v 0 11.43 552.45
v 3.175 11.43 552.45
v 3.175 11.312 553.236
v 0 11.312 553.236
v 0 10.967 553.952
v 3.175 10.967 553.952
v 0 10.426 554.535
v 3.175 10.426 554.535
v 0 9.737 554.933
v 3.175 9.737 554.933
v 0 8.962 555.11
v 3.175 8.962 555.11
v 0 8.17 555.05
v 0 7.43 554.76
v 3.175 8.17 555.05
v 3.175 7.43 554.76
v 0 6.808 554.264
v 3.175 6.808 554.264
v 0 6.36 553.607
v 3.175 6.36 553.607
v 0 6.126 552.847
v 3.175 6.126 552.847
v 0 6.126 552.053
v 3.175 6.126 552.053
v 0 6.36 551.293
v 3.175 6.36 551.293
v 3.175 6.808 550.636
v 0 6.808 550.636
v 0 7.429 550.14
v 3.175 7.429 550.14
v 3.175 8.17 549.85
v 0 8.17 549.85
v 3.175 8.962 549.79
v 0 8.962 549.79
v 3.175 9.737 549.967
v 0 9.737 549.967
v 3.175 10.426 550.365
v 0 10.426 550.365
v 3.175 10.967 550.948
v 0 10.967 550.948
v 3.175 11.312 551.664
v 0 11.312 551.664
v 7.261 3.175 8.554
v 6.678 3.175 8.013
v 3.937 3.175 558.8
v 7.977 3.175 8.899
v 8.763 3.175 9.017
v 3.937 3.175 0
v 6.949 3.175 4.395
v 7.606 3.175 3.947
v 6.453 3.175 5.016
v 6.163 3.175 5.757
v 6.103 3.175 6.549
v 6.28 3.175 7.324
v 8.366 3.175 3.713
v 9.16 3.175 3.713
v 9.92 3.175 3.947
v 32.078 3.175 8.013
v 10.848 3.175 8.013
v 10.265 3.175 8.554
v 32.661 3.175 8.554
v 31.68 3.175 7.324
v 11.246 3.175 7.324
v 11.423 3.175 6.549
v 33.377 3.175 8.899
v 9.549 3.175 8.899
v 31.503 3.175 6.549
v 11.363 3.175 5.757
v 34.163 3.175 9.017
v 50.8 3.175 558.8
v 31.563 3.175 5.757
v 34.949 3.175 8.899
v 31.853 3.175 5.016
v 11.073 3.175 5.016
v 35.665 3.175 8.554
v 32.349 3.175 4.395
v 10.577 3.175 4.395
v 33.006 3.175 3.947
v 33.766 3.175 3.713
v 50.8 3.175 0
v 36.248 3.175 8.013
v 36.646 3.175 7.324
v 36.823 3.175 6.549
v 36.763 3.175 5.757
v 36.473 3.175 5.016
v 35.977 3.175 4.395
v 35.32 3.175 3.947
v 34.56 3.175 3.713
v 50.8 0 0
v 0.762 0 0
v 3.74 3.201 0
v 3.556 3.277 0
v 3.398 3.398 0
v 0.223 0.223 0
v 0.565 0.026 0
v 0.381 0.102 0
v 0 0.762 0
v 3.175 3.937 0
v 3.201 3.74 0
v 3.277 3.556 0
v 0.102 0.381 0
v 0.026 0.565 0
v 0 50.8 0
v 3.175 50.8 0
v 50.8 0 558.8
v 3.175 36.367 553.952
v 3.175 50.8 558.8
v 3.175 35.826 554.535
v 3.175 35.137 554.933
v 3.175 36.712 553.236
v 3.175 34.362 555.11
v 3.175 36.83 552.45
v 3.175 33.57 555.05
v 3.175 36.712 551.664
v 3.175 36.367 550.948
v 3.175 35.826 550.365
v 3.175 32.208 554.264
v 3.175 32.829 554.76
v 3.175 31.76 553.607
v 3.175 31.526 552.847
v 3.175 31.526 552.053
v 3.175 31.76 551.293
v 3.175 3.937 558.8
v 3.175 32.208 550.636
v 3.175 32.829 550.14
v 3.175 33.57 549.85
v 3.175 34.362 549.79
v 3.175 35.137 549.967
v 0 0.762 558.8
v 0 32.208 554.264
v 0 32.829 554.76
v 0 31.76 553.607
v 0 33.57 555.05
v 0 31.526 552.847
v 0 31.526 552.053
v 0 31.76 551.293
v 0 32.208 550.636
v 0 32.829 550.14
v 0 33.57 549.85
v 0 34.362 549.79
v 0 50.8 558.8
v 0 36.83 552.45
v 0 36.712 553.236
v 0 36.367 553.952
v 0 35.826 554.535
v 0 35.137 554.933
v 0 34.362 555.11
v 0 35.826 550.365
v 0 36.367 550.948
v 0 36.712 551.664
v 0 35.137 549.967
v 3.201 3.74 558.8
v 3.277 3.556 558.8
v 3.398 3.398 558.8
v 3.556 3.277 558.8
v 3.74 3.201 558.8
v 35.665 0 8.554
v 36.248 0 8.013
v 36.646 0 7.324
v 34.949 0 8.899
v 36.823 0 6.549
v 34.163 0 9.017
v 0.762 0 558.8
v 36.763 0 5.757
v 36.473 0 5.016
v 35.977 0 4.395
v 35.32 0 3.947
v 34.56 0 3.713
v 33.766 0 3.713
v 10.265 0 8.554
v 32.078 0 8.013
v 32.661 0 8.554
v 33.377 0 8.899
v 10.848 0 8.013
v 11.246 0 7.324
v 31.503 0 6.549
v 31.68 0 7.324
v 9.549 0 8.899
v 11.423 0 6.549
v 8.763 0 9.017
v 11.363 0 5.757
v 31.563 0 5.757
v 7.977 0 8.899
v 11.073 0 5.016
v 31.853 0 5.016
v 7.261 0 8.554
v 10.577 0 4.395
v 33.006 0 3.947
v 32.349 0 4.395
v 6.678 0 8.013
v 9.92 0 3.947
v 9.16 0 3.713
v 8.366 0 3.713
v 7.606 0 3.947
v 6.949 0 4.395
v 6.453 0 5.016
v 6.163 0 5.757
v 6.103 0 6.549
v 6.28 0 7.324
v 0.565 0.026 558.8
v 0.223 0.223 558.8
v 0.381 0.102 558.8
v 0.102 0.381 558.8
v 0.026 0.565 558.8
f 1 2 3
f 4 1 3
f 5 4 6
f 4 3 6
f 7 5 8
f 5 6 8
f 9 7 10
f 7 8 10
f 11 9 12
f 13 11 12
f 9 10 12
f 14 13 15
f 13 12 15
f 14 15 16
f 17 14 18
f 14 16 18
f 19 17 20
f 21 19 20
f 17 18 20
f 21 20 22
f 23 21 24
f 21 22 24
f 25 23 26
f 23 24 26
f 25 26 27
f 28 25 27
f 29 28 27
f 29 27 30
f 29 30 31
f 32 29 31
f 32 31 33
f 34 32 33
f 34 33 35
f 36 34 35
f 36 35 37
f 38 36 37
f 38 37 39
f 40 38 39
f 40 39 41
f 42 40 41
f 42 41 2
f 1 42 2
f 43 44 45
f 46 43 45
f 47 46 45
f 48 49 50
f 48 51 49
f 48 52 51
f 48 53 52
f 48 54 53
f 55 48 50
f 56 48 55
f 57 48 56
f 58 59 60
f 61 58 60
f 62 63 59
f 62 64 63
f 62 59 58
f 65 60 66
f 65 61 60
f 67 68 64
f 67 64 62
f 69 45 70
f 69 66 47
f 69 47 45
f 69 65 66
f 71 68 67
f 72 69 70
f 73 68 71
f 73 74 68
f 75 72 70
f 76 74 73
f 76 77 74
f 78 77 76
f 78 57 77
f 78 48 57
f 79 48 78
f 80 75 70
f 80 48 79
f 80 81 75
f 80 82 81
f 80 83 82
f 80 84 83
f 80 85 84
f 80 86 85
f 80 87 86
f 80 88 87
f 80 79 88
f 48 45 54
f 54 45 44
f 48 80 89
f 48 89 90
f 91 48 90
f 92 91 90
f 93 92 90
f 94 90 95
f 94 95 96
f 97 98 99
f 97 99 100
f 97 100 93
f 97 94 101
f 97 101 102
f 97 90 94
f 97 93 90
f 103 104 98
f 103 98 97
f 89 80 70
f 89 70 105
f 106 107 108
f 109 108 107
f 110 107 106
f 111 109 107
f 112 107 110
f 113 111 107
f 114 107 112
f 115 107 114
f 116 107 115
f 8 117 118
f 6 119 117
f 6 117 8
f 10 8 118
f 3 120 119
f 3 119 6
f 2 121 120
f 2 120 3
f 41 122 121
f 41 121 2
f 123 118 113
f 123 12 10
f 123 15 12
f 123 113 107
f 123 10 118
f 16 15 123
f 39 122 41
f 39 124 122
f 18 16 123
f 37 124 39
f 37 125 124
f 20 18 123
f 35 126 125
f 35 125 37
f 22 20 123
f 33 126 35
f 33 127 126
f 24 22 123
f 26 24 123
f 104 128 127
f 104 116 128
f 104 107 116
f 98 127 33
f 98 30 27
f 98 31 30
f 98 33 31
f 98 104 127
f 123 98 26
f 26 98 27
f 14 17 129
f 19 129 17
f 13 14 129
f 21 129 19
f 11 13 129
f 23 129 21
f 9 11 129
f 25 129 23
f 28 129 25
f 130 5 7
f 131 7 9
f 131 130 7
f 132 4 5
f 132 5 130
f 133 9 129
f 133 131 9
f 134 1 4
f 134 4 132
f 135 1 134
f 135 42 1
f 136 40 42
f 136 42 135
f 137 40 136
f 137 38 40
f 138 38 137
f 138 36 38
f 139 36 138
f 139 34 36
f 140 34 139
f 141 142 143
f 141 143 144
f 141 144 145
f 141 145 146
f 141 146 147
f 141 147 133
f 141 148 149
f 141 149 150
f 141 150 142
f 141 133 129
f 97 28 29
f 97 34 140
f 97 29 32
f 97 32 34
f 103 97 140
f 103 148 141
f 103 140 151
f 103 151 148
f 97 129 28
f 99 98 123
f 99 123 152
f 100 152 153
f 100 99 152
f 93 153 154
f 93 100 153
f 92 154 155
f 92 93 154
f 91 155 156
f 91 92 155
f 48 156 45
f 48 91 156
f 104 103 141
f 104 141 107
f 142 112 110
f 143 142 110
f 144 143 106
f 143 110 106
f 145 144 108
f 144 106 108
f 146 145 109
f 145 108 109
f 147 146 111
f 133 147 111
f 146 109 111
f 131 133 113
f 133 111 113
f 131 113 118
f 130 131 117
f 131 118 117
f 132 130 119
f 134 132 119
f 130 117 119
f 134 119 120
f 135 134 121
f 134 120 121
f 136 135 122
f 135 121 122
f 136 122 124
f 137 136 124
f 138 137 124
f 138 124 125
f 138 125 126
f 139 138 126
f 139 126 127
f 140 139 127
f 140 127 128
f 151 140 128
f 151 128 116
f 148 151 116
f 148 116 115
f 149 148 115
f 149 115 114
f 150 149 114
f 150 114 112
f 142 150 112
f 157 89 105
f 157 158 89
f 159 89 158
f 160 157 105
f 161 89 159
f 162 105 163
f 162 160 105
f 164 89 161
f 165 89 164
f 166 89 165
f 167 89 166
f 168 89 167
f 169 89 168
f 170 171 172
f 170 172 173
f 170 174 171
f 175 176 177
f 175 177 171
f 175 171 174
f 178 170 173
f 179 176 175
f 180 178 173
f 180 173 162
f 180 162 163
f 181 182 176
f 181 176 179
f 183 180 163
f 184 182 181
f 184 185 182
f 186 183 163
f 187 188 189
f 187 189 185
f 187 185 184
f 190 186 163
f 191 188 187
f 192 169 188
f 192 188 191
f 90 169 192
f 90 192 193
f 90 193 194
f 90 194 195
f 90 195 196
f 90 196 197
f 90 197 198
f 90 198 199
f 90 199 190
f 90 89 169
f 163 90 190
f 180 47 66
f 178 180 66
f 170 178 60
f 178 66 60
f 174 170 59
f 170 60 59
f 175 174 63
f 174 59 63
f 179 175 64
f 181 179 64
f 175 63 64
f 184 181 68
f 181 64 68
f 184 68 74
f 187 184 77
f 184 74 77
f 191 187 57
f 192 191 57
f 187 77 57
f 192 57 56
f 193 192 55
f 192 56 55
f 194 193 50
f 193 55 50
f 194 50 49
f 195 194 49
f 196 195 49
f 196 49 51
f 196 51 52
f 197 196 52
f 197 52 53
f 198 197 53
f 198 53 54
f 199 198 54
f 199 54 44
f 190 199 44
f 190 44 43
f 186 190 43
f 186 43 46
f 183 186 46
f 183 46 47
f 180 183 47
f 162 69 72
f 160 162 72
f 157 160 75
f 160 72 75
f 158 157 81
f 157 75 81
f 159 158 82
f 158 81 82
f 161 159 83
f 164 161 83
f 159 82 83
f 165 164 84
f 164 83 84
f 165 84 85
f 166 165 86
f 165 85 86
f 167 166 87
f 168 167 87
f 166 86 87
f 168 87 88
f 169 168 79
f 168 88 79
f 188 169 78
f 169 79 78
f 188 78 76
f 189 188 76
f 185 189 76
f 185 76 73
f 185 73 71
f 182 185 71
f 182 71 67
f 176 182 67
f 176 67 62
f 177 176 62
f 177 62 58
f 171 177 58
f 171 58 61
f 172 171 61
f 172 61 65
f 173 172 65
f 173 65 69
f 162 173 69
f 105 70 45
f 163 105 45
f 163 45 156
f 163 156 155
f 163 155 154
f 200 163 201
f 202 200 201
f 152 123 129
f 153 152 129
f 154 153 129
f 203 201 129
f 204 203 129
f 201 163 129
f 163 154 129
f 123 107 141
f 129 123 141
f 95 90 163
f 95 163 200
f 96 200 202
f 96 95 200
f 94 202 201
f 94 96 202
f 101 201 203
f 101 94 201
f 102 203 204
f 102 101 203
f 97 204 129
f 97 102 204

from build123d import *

# Parameters (mm, degrees)
BOSS_EXTRUDE1_DEPTH = 558.8
SKETCH2_R           = 2.667
CUT_EXTRUDE1_DEPTH  = 564.121852377
SKETCH3_R           = 2.667
CUT_EXTRUDE2_DEPTH  = 564.121852377


with BuildPart() as part:
    # Sketch1 → Boss-Extrude1 (new body)
    with BuildSketch(Plane.XY):
        with BuildLine():
            Line((3.175, 50.8), (3.175, 3.937))
            ThreePointArc((3.175, 3.937), (3.398184633, 3.398184633), (3.937, 3.175))
            Line((3.937, 3.175), (50.8, 3.175))
            Line((50.8, 3.175), (50.8, 0))
            Line((50.8, 0), (0.762, 0))
            ThreePointArc((0.762, 0), (0.223184633, 0.223184633), (0, 0.762))
            Line((0, 0.762), (0, 50.8))
            Line((0, 50.8), (3.175, 50.8))
        make_face()
    extrude(amount=BOSS_EXTRUDE1_DEPTH)

    # Sketch2 → Cut-Extrude1 (cut, through all)
    with BuildSketch(Plane(origin=(0, 3.175, 0), x_dir=(1, 0, 0), z_dir=(0, 1, 0))):
        with Locations(Location((34.163, -6.35, 0), (0, 0, 270))):
            Circle(SKETCH2_R)
        with Locations(Location((8.763, -6.35, 0), (0, 0, 270))):
            Circle(SKETCH2_R)
    extrude(amount=-CUT_EXTRUDE1_DEPTH, mode=Mode.SUBTRACT)

    # Sketch3 → Cut-Extrude2 (cut, through all)
    with BuildSketch(Plane(origin=(3.175, 0, 0), x_dir=(0, 0, -1), z_dir=(1, 0, 0))):
        with Locations(Location((-552.45, 34.163, 0), (0, 0, 90))):
            Circle(SKETCH3_R)
        with Locations(Location((-552.45, 8.763, 0), (0, 0, 90))):
            Circle(SKETCH3_R)
    extrude(amount=-CUT_EXTRUDE2_DEPTH, mode=Mode.SUBTRACT)


solid = part.part
